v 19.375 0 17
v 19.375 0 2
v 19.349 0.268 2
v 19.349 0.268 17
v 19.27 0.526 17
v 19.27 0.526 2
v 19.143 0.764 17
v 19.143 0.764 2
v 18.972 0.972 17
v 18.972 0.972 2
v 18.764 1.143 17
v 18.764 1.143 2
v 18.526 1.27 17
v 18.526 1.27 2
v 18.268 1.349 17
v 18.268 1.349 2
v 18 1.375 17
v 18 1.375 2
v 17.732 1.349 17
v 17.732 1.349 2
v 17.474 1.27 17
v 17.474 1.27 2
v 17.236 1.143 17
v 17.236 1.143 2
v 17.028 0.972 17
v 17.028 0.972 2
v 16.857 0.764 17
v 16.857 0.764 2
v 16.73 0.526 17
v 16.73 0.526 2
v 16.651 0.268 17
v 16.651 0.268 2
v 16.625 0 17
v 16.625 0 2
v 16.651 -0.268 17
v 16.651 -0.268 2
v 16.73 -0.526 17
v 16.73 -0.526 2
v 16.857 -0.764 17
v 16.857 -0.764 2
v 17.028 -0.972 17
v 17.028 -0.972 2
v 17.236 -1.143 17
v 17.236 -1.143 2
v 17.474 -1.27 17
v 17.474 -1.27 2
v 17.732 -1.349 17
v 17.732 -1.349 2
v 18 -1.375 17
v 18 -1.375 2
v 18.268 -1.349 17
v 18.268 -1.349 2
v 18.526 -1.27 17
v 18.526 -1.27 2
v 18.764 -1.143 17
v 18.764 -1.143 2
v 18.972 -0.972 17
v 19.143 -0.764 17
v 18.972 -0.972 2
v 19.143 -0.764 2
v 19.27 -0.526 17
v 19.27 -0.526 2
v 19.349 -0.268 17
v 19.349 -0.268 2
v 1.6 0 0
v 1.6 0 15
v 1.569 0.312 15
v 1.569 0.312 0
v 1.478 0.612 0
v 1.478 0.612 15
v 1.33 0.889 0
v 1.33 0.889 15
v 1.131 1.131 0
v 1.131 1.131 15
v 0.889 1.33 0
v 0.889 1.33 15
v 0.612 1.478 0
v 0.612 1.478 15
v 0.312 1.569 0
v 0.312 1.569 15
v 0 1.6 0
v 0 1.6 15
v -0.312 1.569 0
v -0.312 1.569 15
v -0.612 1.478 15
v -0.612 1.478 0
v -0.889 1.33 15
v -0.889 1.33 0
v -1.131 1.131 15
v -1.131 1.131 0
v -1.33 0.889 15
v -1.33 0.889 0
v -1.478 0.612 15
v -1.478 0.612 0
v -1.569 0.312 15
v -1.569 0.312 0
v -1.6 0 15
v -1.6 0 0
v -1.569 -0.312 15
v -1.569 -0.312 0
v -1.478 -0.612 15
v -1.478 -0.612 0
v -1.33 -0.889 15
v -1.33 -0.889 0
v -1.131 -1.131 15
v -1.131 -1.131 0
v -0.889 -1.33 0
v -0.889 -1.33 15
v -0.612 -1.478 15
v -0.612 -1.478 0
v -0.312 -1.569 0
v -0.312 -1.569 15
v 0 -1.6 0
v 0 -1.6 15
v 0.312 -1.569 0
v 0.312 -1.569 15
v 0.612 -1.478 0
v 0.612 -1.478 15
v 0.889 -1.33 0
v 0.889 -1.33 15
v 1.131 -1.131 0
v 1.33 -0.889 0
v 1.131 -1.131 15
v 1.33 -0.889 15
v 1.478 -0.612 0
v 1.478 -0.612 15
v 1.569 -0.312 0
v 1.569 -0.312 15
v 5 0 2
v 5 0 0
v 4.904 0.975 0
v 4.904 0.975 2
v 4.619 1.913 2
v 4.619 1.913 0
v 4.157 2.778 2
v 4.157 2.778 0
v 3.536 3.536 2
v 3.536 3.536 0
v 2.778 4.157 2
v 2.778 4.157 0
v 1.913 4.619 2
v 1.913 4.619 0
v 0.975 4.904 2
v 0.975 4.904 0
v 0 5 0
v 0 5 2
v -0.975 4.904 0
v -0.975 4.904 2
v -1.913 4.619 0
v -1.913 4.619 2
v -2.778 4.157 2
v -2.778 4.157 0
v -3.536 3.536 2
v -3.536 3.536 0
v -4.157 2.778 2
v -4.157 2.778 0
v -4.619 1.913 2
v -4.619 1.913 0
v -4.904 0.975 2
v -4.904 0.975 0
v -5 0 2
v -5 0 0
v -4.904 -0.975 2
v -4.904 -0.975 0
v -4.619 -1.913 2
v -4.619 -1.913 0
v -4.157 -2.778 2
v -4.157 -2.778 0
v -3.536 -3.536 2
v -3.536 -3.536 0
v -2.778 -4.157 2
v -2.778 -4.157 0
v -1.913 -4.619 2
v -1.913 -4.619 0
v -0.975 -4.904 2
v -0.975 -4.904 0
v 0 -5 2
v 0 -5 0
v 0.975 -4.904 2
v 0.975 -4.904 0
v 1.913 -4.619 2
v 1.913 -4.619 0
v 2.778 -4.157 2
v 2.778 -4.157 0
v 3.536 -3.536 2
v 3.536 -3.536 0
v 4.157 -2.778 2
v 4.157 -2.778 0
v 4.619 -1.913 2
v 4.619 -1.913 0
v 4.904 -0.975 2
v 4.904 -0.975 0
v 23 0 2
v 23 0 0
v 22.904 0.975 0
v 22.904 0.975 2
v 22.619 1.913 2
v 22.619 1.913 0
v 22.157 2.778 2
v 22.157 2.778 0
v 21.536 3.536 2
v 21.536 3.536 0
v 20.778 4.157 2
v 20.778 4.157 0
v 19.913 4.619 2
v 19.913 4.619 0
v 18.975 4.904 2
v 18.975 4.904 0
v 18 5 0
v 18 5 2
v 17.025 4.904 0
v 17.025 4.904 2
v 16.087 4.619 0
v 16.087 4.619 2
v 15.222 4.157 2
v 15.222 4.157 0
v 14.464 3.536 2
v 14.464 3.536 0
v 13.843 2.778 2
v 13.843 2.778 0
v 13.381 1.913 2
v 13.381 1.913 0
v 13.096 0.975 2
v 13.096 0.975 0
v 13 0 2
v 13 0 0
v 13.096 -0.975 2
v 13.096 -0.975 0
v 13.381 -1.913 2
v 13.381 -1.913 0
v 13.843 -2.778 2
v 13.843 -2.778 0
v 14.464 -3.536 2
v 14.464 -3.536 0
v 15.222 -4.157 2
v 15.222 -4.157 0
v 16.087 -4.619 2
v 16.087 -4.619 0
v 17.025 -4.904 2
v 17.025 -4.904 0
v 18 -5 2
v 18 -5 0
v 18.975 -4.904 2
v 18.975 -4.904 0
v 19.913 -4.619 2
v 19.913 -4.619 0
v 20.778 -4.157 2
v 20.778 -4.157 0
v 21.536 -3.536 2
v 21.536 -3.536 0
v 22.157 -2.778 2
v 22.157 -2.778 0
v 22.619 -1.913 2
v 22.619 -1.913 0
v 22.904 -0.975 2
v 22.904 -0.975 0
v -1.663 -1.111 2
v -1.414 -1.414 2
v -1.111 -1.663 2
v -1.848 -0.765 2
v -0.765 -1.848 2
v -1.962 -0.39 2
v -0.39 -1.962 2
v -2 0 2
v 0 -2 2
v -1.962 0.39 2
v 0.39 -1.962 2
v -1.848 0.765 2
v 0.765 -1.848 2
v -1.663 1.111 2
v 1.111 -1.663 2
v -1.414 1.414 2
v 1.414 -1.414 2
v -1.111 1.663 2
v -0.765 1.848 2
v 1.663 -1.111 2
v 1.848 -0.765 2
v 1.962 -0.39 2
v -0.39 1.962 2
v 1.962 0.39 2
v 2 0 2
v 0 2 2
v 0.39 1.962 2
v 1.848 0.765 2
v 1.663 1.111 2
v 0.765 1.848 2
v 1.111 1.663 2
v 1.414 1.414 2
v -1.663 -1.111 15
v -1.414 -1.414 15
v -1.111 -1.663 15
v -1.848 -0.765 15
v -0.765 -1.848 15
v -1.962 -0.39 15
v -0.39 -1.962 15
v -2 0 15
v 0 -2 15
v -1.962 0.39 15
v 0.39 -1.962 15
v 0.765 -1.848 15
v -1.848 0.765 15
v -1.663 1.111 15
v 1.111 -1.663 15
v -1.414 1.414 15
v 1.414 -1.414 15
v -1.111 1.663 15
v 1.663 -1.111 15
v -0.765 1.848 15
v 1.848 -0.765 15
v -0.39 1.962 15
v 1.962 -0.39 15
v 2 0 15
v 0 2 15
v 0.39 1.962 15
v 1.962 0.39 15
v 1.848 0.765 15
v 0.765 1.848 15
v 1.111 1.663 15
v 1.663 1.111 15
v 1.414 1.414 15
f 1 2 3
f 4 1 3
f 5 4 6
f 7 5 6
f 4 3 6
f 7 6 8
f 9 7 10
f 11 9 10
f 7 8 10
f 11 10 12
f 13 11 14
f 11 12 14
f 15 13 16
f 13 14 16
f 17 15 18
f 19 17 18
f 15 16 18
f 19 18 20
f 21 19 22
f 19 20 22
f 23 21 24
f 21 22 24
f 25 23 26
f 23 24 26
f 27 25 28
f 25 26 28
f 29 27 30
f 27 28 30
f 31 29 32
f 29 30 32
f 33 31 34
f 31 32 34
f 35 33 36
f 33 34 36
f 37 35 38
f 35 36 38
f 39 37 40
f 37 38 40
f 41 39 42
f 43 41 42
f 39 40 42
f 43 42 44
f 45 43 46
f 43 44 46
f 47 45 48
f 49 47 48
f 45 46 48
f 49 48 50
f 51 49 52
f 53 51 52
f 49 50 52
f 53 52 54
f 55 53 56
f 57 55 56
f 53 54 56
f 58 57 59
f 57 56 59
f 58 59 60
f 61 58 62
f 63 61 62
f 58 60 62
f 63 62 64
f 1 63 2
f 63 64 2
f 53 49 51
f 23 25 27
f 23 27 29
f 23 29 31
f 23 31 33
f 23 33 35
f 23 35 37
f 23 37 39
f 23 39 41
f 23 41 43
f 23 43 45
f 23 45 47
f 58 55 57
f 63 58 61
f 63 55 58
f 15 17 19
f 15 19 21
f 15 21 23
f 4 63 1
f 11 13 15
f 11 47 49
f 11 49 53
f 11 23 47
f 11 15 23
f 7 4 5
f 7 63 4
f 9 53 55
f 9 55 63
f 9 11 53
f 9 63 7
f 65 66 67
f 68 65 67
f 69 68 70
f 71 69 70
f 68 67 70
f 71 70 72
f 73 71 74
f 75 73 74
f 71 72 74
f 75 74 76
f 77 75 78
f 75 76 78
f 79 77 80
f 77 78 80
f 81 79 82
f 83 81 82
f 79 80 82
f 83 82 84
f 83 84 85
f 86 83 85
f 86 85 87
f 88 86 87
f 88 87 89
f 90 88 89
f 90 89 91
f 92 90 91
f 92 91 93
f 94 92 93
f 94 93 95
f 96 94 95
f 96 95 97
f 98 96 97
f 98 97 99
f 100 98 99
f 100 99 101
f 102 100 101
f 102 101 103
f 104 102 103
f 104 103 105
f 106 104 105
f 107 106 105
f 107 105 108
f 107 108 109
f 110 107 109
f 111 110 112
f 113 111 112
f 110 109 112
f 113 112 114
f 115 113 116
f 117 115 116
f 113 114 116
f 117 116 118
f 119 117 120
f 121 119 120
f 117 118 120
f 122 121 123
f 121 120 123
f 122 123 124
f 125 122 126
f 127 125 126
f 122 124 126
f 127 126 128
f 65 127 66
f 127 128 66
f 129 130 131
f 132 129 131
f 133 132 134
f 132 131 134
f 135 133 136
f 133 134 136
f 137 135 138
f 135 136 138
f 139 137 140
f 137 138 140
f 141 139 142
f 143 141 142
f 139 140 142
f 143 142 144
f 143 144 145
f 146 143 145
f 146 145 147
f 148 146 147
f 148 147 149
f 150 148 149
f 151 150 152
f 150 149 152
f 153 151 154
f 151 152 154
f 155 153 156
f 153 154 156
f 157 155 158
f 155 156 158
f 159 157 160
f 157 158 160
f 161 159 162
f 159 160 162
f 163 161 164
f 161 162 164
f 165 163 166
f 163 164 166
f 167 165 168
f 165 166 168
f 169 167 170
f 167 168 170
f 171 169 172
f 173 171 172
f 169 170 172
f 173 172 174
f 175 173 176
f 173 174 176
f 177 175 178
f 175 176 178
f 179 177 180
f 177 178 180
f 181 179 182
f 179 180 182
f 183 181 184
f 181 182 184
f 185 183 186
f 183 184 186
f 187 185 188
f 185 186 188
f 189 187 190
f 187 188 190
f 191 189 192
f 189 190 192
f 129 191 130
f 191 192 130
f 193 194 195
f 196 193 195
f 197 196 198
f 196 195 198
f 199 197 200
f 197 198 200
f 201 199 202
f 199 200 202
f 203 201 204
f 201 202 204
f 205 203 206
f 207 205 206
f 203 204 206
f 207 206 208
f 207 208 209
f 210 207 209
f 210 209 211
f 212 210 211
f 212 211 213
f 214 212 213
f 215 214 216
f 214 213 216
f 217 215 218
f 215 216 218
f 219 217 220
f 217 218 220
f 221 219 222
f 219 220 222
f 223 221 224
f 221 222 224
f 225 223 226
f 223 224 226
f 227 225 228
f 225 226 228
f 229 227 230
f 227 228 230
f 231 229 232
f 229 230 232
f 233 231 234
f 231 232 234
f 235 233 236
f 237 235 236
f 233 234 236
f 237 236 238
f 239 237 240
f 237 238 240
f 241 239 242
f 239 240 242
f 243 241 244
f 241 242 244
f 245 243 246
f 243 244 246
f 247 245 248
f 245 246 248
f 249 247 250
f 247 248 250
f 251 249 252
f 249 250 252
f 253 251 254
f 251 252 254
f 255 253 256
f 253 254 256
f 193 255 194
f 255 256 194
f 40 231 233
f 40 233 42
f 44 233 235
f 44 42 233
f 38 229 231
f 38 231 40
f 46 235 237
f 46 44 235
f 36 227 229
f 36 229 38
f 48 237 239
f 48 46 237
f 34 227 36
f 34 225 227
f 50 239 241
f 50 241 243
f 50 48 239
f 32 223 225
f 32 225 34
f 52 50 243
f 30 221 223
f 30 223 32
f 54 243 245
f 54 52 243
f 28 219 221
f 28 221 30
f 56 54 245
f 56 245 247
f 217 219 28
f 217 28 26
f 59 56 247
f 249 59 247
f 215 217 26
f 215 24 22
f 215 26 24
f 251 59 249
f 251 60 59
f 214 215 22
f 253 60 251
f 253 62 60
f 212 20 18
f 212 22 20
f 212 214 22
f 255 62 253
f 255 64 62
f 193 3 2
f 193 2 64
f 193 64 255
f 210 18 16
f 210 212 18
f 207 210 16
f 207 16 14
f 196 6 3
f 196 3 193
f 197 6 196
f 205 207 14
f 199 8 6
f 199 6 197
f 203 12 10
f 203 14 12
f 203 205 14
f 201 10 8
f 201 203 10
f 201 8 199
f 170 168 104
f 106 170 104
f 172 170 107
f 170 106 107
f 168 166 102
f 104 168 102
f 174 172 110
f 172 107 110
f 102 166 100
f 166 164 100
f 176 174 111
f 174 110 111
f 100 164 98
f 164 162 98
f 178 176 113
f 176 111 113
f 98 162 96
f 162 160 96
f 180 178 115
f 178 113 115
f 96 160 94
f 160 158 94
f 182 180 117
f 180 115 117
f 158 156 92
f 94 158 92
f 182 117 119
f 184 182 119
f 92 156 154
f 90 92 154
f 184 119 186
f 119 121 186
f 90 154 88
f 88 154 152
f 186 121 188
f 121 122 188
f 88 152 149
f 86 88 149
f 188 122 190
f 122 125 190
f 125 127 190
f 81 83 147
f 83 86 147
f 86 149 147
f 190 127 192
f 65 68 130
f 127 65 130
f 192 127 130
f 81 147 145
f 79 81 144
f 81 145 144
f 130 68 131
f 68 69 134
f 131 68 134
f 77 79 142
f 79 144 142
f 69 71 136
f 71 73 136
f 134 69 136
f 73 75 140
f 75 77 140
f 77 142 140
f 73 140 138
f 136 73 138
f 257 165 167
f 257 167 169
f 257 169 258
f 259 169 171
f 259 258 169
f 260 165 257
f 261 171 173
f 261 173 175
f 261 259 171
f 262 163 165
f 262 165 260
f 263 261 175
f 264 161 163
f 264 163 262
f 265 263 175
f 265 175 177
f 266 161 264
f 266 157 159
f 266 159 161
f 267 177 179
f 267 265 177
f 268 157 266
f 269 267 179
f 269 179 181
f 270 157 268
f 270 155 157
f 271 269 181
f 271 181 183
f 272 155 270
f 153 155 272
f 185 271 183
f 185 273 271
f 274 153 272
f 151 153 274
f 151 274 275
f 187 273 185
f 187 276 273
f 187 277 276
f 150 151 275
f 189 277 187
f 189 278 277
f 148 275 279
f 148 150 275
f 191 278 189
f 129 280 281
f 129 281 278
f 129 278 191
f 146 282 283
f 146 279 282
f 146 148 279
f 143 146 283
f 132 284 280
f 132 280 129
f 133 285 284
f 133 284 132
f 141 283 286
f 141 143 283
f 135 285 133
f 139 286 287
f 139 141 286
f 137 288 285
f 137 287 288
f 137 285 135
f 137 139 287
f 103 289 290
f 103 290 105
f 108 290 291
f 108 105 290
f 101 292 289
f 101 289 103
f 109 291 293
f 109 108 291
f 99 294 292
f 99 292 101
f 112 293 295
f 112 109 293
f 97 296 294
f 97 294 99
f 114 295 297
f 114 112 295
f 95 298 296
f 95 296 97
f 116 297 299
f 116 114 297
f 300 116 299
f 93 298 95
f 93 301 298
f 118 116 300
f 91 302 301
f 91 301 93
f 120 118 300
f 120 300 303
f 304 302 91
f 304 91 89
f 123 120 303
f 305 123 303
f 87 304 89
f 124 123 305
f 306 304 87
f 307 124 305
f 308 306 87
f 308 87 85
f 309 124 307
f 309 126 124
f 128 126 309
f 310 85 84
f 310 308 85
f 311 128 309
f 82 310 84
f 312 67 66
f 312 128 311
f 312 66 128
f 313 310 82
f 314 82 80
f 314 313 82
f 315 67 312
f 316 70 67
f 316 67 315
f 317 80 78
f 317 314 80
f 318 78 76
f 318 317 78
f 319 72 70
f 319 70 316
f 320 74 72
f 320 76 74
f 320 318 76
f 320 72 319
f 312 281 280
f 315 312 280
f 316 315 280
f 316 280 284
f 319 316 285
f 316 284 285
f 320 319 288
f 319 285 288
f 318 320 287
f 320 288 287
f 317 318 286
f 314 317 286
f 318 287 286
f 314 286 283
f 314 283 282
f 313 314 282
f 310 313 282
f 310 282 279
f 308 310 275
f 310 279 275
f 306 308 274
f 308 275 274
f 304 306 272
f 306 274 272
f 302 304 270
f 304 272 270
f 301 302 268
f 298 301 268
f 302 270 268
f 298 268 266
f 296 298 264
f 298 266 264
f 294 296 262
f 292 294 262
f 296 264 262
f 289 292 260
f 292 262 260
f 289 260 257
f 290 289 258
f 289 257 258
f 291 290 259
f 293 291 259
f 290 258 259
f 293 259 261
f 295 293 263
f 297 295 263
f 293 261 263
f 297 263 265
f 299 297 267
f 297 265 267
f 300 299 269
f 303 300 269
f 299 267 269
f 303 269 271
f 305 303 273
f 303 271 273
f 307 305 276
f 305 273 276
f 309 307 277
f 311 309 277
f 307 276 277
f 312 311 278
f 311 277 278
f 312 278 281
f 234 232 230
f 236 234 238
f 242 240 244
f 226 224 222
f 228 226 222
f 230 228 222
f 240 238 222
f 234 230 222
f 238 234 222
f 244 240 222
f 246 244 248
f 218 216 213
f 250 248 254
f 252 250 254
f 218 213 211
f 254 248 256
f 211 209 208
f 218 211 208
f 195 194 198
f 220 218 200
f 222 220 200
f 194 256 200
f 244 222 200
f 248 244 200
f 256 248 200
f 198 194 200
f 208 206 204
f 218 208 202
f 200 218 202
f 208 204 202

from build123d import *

# Parameters (mm, degrees)
F0_R     = 5
F1_DEPTH = 2
F2_R     = 2
F3_DEPTH = 13
F4_R     = 1.6
F5_DEPTH = 15.001
F6_R     = 5
F7_DEPTH = 2
F8_R     = 1.375
F9_DEPTH = 15


with BuildPart() as f1:
    # F0 (on Top) → F1 (new body)
    with BuildSketch(Plane.XY):
        Circle(F0_R)
    extrude(amount=F1_DEPTH)

    # F2 (on face) → F3 (join)
    with BuildSketch(Plane.XY.offset(2)):
        Circle(F2_R)
    extrude(amount=F3_DEPTH)

    # F4 (on face) → F5 (cut, through all)
    with BuildSketch(Plane.XY.offset(15)):
        Circle(F4_R)
    extrude(amount=-F5_DEPTH, mode=Mode.SUBTRACT)


with BuildPart() as f7:
    # F6 (on Top) → F7 (new body)
    with BuildSketch(Plane.XY):
        with Locations((18, 0)):
            Circle(F6_R)
    extrude(amount=F7_DEPTH)

    # F8 (on face) → F9 (join)
    with BuildSketch(Plane.XY.offset(2)):
        with Locations((18, 0)):
            Circle(F8_R)
    extrude(amount=F9_DEPTH)


solid = Compound([f1.part, f7.part])
